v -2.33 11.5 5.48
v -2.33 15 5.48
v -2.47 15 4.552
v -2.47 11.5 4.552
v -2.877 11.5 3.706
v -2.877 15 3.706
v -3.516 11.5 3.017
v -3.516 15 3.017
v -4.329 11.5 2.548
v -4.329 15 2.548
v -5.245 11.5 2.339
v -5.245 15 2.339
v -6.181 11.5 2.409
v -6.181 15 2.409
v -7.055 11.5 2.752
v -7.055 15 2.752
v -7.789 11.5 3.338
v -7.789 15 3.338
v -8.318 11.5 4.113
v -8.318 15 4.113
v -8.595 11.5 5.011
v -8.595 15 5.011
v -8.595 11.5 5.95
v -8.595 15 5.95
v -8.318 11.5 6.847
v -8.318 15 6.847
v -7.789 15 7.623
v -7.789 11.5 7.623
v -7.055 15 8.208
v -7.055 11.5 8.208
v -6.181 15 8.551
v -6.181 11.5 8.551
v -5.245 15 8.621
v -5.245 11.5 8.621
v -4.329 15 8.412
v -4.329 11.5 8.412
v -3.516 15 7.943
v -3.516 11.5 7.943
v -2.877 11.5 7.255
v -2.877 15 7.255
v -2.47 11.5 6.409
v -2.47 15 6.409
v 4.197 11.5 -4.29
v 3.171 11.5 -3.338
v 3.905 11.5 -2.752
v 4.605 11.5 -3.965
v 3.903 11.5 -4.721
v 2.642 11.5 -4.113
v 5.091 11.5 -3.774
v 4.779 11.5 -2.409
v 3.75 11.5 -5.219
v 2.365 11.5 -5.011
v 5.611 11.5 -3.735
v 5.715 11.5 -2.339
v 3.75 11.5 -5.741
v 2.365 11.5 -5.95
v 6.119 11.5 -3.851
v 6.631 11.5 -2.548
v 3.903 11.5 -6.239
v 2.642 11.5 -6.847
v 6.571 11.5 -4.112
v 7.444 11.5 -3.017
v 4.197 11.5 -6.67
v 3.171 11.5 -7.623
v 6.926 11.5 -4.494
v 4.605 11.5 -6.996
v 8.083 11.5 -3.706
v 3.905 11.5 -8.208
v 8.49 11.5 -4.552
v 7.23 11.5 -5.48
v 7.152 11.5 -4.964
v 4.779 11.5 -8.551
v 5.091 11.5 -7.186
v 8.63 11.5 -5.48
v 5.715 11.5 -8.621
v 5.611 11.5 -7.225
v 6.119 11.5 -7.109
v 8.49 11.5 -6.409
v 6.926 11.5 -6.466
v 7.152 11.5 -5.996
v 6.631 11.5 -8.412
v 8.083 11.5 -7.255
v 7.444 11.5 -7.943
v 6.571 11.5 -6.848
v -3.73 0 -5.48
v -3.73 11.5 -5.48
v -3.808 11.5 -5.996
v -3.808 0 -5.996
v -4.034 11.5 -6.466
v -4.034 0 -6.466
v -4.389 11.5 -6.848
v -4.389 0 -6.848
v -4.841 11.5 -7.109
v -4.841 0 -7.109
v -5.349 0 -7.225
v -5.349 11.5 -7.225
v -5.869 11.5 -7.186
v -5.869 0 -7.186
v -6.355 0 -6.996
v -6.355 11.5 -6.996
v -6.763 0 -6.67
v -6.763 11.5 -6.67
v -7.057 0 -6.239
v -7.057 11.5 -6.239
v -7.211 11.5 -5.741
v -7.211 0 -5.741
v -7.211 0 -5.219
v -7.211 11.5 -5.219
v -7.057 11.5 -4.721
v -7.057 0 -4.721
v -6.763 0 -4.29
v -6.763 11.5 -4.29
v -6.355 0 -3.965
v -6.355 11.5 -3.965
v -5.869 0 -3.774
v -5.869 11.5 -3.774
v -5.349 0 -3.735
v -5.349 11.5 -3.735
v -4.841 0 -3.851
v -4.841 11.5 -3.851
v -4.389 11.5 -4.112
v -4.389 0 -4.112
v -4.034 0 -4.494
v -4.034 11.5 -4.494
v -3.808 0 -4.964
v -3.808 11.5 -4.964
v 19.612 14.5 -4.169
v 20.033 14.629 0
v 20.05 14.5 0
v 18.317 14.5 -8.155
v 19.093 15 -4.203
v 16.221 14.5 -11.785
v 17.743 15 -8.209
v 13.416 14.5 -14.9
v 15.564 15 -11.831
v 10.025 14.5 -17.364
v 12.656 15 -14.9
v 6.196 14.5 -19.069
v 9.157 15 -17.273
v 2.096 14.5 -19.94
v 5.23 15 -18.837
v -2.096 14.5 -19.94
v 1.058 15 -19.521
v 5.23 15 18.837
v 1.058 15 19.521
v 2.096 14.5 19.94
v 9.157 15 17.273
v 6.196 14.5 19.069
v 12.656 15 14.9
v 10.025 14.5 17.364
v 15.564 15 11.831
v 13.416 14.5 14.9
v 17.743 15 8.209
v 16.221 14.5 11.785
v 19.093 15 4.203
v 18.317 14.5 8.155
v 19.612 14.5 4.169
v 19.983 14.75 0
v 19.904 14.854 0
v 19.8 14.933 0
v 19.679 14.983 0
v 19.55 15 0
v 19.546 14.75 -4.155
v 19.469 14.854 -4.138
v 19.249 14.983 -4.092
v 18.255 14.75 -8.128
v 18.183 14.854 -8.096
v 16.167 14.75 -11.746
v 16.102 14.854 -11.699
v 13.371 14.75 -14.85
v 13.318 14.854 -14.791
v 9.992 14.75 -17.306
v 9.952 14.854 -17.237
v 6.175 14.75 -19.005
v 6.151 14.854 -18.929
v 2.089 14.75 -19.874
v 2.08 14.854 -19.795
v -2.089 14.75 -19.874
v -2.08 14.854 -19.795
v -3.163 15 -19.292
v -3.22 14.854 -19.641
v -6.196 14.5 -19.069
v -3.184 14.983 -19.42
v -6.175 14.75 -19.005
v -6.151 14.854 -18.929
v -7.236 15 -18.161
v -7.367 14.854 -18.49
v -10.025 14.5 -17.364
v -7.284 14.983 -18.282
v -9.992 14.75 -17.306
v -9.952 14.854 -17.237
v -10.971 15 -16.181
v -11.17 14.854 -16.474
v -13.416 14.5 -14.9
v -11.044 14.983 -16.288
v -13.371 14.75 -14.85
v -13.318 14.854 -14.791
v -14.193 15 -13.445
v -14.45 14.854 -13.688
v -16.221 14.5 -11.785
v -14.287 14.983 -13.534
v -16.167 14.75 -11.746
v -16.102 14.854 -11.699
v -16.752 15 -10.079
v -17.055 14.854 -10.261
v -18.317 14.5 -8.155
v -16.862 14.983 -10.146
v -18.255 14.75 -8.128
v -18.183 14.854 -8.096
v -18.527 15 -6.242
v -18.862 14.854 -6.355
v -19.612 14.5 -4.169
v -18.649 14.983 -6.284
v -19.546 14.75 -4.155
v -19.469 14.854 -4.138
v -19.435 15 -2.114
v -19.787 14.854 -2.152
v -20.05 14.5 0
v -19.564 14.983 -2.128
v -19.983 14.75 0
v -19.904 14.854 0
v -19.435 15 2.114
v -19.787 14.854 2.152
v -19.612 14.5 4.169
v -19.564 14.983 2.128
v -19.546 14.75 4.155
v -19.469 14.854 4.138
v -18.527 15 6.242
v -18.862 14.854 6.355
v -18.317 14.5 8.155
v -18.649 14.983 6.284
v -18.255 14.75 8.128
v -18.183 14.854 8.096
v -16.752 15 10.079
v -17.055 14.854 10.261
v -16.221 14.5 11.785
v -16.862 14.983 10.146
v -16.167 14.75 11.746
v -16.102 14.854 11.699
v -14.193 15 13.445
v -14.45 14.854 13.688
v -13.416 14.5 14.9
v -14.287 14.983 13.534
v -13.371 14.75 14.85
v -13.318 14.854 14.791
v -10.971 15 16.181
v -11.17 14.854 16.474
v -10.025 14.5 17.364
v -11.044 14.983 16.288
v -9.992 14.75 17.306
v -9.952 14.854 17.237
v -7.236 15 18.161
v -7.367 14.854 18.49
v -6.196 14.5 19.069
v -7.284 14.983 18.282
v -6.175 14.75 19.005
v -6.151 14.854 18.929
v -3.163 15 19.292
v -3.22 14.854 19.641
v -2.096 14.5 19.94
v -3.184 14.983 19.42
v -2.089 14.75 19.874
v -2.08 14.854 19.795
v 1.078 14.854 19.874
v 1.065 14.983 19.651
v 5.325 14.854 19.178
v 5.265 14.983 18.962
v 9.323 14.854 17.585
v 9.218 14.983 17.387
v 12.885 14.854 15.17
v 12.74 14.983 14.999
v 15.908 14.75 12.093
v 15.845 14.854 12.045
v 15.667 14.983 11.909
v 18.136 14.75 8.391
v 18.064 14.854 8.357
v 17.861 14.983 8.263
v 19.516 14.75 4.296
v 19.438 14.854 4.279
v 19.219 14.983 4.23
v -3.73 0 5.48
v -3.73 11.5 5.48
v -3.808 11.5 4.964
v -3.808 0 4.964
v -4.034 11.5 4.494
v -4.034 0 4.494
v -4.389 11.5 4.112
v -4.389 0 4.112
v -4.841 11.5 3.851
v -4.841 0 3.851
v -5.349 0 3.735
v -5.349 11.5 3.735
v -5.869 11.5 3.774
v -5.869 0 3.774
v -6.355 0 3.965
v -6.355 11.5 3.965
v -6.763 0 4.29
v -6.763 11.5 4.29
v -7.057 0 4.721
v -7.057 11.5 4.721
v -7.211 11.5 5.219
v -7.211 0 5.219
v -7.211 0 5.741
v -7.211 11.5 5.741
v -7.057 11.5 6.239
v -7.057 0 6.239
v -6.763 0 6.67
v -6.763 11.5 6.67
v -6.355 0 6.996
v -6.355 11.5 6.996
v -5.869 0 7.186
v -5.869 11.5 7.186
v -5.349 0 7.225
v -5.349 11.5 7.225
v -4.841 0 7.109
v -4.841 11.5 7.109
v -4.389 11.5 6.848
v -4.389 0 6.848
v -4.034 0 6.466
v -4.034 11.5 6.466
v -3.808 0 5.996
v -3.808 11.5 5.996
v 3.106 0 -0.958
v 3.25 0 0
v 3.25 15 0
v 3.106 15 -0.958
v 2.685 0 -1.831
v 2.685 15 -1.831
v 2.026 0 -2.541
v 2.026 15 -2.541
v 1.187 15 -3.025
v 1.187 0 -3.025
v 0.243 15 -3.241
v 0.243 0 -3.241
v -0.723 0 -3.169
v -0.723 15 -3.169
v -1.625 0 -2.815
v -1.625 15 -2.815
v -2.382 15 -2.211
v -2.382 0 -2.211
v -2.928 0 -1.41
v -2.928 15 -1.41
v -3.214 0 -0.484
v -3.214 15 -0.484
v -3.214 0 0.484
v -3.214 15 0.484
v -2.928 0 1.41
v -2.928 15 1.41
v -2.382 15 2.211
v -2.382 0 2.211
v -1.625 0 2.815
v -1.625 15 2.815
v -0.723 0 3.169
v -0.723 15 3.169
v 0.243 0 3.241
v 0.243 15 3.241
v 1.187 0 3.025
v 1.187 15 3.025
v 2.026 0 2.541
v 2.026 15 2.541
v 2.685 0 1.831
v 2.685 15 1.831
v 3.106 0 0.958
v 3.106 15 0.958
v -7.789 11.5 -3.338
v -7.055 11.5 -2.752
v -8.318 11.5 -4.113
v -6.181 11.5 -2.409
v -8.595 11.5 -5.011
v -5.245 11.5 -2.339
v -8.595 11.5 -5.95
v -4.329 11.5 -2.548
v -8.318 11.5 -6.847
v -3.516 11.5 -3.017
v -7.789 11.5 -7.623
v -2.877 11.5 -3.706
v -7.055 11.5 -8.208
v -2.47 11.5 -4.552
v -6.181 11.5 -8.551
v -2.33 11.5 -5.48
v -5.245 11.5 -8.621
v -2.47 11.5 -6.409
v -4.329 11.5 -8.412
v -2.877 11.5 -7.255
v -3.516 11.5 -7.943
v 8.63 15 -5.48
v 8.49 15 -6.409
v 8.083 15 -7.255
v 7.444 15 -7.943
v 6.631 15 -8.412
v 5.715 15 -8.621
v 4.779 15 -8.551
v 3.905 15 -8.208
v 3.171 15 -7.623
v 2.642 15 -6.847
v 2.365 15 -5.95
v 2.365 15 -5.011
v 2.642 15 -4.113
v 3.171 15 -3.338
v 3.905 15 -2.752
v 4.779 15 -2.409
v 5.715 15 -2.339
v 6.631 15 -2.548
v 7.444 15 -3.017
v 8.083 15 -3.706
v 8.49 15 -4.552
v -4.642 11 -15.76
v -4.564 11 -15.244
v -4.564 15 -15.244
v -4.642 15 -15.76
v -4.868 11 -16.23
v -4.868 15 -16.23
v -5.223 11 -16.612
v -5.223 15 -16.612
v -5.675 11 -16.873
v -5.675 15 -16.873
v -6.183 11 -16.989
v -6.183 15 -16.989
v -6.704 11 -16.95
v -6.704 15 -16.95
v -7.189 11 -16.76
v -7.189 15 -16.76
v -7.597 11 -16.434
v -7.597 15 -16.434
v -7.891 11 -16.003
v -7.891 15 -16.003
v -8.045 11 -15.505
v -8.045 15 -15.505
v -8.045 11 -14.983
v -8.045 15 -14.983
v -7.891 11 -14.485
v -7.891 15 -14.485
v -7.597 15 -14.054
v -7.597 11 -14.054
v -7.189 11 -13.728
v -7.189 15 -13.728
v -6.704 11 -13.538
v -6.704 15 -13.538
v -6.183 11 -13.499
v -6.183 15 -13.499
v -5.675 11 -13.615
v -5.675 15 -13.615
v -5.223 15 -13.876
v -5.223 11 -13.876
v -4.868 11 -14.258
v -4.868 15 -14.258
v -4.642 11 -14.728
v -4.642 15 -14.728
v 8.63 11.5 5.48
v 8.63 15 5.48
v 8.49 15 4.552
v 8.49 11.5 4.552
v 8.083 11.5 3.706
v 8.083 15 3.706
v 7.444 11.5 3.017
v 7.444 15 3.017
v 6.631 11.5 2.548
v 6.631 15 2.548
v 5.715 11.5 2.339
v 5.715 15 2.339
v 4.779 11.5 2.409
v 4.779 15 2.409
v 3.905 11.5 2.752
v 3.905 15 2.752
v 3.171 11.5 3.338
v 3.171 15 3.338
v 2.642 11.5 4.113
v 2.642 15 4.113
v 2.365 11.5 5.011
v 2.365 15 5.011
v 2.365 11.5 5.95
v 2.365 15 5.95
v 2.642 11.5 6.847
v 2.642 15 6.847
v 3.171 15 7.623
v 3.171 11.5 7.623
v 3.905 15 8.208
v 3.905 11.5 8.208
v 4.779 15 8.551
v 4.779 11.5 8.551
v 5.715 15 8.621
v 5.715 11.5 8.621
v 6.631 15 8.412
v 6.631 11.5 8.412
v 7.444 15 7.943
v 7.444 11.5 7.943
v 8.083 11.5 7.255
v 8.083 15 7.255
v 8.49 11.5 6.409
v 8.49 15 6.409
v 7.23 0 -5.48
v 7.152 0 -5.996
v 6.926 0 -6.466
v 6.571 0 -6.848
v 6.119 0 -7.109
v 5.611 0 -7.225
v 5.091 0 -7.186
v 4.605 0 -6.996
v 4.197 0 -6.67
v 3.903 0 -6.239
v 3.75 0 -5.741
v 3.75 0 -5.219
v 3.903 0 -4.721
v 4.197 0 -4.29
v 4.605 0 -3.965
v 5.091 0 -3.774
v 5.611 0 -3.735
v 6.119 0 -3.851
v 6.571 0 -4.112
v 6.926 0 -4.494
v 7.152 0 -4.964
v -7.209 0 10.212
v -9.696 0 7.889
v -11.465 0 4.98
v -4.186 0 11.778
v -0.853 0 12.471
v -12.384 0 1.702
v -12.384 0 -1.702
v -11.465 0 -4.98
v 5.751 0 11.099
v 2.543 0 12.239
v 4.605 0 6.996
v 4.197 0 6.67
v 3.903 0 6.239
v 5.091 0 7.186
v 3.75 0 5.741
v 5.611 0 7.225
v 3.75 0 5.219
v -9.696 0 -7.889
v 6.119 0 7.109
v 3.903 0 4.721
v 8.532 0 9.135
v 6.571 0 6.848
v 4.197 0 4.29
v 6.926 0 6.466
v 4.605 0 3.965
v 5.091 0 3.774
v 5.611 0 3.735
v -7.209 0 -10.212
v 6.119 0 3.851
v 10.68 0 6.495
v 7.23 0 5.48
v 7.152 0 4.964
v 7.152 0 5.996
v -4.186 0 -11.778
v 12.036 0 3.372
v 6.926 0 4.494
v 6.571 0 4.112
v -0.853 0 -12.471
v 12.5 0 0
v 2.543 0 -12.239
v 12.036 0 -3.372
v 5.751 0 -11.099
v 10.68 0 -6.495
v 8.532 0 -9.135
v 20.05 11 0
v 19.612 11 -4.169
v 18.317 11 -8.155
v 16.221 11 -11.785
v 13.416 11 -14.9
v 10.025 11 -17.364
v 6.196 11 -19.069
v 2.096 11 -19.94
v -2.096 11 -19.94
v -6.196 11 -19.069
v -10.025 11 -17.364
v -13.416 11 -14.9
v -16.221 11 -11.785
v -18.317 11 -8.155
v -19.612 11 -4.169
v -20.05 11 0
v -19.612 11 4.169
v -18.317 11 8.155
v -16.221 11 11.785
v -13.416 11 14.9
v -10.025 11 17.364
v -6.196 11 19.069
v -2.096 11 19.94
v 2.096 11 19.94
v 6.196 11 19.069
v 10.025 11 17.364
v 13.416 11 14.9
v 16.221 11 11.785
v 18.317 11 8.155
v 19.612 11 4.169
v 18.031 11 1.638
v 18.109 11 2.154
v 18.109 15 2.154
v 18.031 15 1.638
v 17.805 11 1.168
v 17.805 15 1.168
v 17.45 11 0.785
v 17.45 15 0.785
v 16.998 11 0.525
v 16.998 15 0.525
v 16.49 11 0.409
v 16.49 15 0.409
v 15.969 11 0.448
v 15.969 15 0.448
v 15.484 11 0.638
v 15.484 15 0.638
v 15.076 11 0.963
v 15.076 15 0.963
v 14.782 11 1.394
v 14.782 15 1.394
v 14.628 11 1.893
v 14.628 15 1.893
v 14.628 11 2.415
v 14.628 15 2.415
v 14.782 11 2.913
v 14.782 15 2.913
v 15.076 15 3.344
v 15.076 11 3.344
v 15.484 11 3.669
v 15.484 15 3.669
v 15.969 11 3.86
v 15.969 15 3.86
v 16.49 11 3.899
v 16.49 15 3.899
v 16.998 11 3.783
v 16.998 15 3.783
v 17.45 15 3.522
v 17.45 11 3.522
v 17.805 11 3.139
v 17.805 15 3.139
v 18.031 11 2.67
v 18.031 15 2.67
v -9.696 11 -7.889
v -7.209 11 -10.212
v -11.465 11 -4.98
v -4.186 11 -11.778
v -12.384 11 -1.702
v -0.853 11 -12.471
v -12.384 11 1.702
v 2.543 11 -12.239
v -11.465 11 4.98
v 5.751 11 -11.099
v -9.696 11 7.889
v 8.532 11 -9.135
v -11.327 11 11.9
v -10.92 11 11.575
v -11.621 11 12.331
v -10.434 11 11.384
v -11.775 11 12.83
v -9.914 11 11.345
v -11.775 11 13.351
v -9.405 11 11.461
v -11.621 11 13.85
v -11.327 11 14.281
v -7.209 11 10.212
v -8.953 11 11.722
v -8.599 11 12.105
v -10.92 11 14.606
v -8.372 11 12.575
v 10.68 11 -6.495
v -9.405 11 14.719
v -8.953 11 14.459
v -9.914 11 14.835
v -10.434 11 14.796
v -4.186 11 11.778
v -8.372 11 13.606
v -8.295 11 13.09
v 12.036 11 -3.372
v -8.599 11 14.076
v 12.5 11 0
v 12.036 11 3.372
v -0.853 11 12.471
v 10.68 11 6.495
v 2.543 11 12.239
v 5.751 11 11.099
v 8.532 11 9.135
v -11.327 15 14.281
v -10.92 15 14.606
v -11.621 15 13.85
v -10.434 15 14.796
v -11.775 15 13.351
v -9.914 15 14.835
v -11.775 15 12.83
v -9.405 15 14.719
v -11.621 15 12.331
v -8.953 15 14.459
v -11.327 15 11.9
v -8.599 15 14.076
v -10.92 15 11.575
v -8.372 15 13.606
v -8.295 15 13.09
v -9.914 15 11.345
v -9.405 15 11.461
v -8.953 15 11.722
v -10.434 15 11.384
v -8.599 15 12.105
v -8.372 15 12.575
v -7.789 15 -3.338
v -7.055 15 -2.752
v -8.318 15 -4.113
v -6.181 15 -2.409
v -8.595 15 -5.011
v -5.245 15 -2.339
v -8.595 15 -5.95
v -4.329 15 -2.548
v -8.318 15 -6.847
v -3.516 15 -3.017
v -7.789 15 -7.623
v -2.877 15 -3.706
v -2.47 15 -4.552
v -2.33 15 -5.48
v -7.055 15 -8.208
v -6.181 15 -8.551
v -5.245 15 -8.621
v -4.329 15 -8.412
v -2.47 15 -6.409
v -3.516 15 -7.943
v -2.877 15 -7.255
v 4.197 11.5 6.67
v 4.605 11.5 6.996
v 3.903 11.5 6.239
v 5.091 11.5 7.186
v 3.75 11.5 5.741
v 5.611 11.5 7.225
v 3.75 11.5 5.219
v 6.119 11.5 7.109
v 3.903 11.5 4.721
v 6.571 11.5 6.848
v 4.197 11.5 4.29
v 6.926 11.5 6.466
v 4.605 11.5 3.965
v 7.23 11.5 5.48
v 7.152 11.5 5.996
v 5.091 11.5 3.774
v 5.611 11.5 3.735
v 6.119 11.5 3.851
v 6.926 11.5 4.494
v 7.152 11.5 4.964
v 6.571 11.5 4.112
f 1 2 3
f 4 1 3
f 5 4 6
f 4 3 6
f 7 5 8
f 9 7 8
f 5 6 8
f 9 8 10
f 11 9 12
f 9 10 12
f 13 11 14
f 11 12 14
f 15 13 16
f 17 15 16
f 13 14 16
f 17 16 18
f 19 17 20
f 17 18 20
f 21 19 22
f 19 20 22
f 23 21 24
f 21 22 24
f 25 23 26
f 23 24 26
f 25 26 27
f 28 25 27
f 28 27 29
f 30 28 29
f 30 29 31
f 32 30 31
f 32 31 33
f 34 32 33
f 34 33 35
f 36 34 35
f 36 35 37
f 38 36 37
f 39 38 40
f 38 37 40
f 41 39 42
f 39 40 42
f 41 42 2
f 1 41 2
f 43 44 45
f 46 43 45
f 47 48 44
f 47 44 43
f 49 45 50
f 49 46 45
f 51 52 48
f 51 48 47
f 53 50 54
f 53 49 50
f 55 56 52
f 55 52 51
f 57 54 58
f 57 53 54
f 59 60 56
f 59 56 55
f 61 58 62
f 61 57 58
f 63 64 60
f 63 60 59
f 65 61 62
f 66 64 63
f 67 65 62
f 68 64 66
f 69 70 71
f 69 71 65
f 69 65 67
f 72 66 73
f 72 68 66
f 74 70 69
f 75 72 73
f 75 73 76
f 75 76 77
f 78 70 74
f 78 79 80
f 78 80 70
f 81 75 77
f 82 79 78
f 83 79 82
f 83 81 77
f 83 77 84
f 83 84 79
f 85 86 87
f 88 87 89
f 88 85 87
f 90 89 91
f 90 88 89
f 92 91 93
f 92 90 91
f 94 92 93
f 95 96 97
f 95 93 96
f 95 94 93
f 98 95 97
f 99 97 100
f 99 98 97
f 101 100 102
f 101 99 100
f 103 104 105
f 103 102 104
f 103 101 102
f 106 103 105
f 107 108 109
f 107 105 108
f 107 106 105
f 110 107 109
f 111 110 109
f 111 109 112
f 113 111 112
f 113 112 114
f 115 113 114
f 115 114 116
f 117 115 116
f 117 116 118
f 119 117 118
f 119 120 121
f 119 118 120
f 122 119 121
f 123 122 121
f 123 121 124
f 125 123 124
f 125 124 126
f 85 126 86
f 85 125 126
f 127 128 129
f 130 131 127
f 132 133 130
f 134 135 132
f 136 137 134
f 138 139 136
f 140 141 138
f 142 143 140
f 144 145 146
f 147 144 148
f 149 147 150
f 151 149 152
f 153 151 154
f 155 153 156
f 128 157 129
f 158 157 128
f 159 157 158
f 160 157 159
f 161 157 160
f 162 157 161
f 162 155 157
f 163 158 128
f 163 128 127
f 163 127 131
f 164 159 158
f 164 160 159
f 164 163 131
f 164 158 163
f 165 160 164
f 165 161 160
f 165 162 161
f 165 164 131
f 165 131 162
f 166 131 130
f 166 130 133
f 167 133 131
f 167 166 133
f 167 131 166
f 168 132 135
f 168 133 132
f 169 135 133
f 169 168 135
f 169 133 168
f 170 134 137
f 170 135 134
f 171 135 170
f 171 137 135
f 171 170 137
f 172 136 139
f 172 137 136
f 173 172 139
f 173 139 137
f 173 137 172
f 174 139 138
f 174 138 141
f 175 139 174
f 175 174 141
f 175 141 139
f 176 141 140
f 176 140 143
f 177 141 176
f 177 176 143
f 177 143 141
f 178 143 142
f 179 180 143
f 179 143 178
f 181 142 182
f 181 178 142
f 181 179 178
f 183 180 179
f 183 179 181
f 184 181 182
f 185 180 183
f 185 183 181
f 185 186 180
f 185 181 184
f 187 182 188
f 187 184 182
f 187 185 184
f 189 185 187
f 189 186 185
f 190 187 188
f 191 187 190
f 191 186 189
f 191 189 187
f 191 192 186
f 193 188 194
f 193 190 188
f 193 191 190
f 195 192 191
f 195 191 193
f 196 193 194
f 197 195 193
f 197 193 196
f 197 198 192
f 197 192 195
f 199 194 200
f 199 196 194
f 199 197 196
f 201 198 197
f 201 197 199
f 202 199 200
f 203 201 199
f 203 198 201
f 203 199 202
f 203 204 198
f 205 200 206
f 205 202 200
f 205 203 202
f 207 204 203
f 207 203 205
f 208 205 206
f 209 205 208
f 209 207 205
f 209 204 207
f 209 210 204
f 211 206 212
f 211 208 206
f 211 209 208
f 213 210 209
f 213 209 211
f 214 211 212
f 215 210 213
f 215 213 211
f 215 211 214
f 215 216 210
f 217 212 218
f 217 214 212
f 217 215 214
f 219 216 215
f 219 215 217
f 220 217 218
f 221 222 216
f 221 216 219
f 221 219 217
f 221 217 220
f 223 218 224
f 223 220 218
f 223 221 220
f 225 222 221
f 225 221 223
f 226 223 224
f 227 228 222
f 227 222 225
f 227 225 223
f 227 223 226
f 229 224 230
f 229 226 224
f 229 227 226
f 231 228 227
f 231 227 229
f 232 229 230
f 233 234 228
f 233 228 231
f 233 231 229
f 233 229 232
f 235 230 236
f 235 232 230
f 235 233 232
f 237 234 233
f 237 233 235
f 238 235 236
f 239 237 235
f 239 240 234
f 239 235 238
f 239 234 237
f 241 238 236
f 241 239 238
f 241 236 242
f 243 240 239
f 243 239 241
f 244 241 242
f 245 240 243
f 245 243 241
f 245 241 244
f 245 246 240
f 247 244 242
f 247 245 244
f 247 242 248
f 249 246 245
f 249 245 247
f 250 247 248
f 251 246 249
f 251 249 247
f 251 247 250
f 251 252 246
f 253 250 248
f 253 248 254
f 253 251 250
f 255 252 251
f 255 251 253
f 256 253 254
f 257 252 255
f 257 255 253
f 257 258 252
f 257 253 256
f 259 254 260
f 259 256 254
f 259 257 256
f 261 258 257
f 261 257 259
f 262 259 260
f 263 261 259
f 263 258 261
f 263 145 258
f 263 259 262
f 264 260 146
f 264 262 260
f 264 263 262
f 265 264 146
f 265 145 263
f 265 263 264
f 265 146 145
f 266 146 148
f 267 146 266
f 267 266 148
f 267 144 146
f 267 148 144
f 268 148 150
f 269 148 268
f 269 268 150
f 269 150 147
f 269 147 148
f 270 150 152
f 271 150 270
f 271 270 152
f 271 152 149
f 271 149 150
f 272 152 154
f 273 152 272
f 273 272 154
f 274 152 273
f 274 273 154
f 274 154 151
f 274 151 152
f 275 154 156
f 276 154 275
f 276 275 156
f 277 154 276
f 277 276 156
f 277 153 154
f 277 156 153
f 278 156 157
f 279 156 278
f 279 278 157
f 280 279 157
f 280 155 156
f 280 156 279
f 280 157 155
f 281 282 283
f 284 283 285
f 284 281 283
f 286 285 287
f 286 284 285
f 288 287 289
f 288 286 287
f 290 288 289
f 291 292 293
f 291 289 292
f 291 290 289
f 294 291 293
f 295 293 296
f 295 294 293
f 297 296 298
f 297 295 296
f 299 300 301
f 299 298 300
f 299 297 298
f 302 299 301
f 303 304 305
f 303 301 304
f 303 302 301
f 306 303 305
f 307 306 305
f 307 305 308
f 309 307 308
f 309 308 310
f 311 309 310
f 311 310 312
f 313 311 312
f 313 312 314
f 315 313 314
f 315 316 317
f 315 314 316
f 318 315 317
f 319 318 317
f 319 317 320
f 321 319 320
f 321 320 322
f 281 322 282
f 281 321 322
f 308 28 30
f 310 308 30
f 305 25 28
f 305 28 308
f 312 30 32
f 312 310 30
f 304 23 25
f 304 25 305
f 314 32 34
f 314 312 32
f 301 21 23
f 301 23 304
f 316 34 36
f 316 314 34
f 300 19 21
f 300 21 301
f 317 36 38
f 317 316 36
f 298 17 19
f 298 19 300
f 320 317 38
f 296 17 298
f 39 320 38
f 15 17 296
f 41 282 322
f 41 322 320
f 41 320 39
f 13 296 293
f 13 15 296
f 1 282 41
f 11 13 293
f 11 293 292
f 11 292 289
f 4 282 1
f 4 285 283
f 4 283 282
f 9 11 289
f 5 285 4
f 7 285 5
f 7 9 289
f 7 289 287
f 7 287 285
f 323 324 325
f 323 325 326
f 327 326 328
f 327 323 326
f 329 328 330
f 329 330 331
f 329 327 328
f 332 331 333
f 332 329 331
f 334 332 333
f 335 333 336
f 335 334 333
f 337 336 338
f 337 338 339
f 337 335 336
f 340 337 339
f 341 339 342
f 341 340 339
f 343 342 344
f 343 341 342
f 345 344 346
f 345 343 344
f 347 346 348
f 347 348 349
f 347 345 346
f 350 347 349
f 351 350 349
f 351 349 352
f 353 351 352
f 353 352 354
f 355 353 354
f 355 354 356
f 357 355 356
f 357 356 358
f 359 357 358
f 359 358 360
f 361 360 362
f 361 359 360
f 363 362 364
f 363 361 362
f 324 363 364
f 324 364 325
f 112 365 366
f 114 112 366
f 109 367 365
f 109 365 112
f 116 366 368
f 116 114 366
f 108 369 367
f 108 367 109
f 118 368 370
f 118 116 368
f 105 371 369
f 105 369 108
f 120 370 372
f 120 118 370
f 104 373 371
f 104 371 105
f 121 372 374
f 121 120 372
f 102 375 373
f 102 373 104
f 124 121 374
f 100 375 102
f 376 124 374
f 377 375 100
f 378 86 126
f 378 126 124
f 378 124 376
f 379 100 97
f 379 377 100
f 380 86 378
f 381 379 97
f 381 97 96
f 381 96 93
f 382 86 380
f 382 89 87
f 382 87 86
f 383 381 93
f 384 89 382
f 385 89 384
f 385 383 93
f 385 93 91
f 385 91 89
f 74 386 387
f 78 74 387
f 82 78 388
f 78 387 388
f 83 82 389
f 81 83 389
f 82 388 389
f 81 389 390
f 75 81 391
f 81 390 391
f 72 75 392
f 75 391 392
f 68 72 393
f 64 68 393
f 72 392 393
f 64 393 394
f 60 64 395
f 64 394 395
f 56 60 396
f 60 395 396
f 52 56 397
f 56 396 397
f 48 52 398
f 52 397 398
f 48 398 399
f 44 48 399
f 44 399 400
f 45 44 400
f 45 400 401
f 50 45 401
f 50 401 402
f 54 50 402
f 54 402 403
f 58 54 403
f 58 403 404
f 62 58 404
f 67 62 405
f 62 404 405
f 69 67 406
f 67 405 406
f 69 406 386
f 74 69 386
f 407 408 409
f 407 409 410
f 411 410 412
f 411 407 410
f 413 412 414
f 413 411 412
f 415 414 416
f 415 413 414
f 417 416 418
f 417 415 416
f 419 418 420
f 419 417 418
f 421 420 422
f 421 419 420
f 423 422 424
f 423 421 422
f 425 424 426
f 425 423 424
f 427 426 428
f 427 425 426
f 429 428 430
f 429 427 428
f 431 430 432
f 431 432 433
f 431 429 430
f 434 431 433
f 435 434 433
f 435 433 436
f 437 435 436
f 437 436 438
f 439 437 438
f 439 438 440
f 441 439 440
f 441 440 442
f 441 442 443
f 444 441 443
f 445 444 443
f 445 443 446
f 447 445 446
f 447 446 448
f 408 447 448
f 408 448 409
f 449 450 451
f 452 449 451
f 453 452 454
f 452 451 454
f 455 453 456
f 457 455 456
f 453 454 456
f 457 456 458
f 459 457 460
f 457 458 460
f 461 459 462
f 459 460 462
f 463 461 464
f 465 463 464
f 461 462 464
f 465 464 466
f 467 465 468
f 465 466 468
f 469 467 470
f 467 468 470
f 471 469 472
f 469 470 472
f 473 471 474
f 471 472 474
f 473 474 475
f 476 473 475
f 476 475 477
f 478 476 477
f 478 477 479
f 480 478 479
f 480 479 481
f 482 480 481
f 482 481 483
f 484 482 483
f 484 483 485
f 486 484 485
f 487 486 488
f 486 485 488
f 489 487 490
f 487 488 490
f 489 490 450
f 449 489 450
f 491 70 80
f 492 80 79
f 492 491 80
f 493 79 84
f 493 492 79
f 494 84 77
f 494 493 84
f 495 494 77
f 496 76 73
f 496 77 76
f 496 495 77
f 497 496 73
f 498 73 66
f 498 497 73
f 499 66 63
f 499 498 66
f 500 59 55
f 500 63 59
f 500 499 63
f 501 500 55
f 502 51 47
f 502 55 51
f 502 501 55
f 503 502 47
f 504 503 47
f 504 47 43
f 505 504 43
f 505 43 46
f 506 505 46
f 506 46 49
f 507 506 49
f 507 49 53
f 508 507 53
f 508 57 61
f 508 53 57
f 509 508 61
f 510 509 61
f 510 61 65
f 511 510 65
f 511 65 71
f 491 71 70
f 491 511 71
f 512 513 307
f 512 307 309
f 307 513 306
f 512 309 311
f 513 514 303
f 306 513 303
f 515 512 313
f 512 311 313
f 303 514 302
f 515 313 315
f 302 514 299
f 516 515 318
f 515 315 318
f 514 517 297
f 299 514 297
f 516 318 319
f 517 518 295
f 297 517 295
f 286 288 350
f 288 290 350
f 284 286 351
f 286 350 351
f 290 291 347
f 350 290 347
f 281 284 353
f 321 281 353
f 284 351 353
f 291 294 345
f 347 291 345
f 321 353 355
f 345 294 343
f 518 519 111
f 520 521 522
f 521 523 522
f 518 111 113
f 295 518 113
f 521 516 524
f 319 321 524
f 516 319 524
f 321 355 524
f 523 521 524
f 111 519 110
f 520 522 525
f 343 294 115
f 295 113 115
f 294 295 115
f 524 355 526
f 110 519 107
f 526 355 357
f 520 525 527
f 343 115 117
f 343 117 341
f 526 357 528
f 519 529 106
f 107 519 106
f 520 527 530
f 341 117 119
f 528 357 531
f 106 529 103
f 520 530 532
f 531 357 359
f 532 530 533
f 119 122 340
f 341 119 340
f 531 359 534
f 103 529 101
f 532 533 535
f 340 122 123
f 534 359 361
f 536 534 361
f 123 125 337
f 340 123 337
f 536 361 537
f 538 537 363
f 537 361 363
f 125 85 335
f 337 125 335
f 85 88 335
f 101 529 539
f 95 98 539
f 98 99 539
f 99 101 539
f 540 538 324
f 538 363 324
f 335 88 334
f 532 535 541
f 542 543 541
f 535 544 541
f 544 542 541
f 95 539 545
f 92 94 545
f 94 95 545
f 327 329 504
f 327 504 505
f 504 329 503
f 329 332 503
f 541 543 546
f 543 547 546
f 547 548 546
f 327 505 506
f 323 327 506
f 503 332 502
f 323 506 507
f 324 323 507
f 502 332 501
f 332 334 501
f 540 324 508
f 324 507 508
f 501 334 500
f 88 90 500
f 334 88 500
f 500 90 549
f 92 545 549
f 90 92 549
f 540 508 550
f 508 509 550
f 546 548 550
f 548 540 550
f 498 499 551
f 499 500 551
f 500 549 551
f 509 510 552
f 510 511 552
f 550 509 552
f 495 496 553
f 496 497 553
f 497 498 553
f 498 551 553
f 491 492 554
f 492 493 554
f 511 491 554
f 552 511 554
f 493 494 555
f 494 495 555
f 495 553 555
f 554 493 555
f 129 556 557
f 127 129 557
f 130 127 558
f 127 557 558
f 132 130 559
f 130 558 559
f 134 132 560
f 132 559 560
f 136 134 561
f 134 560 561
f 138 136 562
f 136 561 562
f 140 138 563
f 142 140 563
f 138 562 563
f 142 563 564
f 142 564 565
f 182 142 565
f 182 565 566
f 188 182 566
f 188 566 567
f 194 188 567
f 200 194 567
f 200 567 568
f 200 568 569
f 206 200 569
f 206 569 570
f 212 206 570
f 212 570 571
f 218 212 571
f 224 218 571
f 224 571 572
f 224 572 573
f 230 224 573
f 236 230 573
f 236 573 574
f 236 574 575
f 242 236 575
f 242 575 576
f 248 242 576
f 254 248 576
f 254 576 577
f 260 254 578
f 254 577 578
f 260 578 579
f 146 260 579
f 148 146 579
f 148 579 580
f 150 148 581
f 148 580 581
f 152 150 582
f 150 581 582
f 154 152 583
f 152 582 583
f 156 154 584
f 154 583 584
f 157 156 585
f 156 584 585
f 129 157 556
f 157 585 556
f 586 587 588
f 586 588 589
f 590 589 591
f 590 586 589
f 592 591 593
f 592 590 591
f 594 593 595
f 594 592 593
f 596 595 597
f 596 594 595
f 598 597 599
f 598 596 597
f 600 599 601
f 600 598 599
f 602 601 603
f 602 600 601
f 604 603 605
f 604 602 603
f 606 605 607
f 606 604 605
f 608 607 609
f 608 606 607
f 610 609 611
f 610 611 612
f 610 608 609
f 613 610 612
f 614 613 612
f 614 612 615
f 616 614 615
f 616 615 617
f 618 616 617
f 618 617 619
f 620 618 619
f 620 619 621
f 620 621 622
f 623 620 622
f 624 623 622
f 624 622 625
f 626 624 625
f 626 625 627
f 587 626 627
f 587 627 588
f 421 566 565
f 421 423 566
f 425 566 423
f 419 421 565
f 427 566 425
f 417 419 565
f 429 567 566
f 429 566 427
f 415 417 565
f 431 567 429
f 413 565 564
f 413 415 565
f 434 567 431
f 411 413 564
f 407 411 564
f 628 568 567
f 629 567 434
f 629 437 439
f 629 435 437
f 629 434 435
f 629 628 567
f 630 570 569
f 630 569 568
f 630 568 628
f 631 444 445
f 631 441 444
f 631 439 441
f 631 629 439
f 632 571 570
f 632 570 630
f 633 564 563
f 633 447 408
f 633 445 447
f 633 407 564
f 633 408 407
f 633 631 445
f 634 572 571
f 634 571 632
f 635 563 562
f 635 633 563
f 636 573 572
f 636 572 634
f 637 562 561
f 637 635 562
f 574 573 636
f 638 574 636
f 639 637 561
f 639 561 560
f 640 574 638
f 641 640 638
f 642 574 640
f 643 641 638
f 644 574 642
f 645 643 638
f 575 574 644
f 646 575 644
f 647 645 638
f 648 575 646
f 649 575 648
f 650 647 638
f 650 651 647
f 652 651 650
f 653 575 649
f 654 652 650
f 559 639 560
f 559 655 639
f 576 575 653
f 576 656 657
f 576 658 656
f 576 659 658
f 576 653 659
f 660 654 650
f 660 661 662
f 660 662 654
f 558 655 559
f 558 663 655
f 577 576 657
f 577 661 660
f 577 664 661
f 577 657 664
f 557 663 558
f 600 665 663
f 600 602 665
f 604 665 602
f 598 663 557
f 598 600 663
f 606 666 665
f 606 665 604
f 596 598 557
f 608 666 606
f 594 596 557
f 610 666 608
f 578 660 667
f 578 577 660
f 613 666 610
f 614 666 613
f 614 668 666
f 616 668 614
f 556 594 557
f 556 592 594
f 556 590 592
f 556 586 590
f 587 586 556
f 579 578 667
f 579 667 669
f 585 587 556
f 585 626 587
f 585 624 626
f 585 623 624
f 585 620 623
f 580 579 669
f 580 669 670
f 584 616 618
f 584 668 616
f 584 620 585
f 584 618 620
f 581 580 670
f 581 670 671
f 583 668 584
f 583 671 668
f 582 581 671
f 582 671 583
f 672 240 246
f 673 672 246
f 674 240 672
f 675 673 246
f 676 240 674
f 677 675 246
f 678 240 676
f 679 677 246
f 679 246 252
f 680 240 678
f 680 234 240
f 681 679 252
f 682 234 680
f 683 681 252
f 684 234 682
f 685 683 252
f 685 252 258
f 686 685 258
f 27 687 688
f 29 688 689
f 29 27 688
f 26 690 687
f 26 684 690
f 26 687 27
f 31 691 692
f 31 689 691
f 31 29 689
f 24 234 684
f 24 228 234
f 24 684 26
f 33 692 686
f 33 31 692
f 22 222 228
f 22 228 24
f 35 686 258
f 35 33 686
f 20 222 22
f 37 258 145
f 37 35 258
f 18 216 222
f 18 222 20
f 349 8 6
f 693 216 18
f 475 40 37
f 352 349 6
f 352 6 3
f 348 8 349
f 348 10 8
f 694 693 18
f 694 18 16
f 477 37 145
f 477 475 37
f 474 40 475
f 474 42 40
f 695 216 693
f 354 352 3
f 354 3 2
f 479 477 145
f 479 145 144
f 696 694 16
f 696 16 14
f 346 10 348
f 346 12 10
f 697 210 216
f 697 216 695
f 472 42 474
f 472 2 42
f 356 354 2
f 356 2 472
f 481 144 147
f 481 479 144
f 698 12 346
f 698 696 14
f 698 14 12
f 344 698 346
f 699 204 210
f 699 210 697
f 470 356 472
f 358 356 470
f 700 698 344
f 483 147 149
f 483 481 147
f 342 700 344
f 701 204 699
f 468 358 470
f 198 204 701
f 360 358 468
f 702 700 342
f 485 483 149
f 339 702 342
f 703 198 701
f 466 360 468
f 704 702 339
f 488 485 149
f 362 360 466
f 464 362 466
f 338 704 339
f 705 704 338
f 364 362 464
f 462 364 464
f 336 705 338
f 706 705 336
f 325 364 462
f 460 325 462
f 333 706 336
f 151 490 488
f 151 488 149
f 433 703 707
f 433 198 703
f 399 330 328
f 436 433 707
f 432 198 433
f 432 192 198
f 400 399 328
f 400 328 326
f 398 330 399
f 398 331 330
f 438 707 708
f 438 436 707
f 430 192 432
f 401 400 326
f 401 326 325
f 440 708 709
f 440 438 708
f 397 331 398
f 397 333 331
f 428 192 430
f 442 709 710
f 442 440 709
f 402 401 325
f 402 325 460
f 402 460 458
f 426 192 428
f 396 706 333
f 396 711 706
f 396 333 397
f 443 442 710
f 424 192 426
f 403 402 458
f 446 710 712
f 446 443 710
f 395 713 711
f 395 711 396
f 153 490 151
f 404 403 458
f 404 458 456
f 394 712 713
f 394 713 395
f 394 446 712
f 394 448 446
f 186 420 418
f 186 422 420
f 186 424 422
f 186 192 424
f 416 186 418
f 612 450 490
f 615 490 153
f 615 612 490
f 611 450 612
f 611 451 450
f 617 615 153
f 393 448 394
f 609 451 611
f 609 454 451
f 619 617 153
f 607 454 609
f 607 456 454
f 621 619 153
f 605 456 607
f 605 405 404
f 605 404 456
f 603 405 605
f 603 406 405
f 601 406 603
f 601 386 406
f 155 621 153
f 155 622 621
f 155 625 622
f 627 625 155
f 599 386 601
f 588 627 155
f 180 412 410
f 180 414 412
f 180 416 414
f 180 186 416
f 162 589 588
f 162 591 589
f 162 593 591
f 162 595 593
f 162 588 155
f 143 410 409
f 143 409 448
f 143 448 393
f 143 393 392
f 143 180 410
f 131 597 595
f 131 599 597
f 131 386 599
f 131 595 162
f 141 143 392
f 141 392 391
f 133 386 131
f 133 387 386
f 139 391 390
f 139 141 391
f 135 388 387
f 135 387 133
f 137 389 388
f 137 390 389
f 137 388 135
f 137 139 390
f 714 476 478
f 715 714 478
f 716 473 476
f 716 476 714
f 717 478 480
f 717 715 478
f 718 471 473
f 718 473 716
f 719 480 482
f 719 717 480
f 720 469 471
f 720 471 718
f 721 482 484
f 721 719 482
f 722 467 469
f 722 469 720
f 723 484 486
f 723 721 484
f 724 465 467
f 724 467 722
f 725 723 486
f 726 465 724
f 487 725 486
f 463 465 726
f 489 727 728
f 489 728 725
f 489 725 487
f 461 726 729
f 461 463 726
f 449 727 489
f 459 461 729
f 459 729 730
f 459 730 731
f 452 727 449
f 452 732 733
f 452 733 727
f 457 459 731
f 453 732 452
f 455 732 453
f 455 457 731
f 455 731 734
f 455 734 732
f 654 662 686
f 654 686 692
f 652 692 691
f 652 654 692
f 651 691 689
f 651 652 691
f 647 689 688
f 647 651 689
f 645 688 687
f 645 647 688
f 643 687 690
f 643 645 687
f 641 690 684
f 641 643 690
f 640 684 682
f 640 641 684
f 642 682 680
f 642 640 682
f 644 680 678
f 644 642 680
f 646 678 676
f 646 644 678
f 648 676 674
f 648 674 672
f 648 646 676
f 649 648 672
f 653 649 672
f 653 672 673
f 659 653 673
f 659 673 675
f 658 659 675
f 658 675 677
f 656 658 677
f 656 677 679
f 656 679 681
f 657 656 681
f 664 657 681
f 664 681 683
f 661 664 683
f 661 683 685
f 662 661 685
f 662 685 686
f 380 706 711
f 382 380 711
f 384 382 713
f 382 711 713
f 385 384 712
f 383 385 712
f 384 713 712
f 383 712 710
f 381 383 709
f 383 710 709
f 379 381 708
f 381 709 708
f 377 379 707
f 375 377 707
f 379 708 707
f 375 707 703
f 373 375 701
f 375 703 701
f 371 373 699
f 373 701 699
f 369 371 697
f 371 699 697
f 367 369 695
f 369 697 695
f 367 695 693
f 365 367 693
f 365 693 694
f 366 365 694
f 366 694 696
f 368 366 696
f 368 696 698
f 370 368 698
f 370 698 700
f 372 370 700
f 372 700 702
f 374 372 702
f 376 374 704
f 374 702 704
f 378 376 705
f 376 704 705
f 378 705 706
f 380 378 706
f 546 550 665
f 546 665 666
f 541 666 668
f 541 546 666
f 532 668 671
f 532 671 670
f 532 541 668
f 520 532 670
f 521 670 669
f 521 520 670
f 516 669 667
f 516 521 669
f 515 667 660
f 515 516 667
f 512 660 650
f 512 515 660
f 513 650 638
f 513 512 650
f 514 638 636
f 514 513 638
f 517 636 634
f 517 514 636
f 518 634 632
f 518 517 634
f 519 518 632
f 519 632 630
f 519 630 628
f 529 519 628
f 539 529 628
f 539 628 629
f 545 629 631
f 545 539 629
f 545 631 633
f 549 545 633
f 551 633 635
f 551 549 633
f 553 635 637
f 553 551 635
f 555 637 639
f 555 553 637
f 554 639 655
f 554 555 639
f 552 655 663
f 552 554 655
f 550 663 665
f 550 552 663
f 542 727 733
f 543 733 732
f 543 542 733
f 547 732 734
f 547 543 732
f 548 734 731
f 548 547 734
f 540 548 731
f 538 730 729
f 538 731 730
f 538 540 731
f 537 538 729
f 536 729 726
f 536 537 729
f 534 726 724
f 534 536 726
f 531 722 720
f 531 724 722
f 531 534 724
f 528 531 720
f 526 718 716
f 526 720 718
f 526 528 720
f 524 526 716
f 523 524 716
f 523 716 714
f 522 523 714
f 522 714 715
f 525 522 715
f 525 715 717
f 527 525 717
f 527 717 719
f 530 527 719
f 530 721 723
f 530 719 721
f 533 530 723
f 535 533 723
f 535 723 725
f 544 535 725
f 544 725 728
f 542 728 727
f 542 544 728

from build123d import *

# Parameters (mm, degrees)
SKETCH1_R      = 20.05
SKETCH1_R_2    = 3.25
SKETCH1_R_3    = 1.75
EXTRUDE1_DEPTH = 15
SKETCH7_R      = 3.15
EXTRUDE4_DEPTH = 3.5
SKETCH8_R      = 20.05
SKETCH8_R_2    = 12.5
EXTRUDE5_DEPTH = 11
FILLET_1_R     = 0.5


with BuildPart() as part:
    # Sketch1 → Extrude1 (new body)
    with BuildSketch(Plane(origin=(0, 0, 0), x_dir=(1, 0, 0), z_dir=(0, 1, 0))):
        Circle(SKETCH1_R)
        Circle(SKETCH1_R_2, mode=Mode.SUBTRACT)
        with Locations((5.480077554, 5.480077554)):
            Circle(SKETCH1_R_3, mode=Mode.SUBTRACT)
        with Locations((5.480077554, -5.480077554)):
            Circle(SKETCH1_R_3, mode=Mode.SUBTRACT)
        with Locations((-5.480077554, -5.480077554)):
            Circle(SKETCH1_R_3, mode=Mode.SUBTRACT)
        with Locations((-5.480077554, 5.480077554)):
            Circle(SKETCH1_R_3, mode=Mode.SUBTRACT)
        with Locations((-10.044563579, -13.090330115)):
            Circle(SKETCH1_R_3, mode=Mode.SUBTRACT)
        with Locations((-6.314276634, 15.244012286)):
            Circle(SKETCH1_R_3, mode=Mode.SUBTRACT)
        with Locations((16.358840213, -2.153682172)):
            Circle(SKETCH1_R_3, mode=Mode.SUBTRACT)
    extrude(amount=EXTRUDE1_DEPTH)

    # Sketch7 → Extrude4 (cut)
    with BuildSketch(Plane(origin=(0, 15, 0), x_dir=(1, 0, 0), z_dir=(0, 1, 0))):
        with Locations((-5.480077554, 5.480077554)):
            Circle(SKETCH7_R)
        with Locations((5.480077554, 5.480077554)):
            Circle(SKETCH7_R)
        with Locations((5.480077554, -5.480077554)):
            Circle(SKETCH7_R)
        with Locations((-5.480077554, -5.480077554)):
            Circle(SKETCH7_R)
    extrude(amount=-EXTRUDE4_DEPTH, mode=Mode.SUBTRACT)

    # Sketch8 → Extrude5 (cut)
    with BuildSketch(Plane.XZ):
        Circle(SKETCH8_R)
        Circle(SKETCH8_R_2, mode=Mode.SUBTRACT)
    extrude(amount=-EXTRUDE5_DEPTH, mode=Mode.SUBTRACT)

    # 圓角1
    fillet_1_edges = [part.edges().sort_by_distance(p)[0] for p in [
        (-20.05, 15, 0),
    ]]
    fillet(fillet_1_edges, radius=FILLET_1_R)


solid = part.part
